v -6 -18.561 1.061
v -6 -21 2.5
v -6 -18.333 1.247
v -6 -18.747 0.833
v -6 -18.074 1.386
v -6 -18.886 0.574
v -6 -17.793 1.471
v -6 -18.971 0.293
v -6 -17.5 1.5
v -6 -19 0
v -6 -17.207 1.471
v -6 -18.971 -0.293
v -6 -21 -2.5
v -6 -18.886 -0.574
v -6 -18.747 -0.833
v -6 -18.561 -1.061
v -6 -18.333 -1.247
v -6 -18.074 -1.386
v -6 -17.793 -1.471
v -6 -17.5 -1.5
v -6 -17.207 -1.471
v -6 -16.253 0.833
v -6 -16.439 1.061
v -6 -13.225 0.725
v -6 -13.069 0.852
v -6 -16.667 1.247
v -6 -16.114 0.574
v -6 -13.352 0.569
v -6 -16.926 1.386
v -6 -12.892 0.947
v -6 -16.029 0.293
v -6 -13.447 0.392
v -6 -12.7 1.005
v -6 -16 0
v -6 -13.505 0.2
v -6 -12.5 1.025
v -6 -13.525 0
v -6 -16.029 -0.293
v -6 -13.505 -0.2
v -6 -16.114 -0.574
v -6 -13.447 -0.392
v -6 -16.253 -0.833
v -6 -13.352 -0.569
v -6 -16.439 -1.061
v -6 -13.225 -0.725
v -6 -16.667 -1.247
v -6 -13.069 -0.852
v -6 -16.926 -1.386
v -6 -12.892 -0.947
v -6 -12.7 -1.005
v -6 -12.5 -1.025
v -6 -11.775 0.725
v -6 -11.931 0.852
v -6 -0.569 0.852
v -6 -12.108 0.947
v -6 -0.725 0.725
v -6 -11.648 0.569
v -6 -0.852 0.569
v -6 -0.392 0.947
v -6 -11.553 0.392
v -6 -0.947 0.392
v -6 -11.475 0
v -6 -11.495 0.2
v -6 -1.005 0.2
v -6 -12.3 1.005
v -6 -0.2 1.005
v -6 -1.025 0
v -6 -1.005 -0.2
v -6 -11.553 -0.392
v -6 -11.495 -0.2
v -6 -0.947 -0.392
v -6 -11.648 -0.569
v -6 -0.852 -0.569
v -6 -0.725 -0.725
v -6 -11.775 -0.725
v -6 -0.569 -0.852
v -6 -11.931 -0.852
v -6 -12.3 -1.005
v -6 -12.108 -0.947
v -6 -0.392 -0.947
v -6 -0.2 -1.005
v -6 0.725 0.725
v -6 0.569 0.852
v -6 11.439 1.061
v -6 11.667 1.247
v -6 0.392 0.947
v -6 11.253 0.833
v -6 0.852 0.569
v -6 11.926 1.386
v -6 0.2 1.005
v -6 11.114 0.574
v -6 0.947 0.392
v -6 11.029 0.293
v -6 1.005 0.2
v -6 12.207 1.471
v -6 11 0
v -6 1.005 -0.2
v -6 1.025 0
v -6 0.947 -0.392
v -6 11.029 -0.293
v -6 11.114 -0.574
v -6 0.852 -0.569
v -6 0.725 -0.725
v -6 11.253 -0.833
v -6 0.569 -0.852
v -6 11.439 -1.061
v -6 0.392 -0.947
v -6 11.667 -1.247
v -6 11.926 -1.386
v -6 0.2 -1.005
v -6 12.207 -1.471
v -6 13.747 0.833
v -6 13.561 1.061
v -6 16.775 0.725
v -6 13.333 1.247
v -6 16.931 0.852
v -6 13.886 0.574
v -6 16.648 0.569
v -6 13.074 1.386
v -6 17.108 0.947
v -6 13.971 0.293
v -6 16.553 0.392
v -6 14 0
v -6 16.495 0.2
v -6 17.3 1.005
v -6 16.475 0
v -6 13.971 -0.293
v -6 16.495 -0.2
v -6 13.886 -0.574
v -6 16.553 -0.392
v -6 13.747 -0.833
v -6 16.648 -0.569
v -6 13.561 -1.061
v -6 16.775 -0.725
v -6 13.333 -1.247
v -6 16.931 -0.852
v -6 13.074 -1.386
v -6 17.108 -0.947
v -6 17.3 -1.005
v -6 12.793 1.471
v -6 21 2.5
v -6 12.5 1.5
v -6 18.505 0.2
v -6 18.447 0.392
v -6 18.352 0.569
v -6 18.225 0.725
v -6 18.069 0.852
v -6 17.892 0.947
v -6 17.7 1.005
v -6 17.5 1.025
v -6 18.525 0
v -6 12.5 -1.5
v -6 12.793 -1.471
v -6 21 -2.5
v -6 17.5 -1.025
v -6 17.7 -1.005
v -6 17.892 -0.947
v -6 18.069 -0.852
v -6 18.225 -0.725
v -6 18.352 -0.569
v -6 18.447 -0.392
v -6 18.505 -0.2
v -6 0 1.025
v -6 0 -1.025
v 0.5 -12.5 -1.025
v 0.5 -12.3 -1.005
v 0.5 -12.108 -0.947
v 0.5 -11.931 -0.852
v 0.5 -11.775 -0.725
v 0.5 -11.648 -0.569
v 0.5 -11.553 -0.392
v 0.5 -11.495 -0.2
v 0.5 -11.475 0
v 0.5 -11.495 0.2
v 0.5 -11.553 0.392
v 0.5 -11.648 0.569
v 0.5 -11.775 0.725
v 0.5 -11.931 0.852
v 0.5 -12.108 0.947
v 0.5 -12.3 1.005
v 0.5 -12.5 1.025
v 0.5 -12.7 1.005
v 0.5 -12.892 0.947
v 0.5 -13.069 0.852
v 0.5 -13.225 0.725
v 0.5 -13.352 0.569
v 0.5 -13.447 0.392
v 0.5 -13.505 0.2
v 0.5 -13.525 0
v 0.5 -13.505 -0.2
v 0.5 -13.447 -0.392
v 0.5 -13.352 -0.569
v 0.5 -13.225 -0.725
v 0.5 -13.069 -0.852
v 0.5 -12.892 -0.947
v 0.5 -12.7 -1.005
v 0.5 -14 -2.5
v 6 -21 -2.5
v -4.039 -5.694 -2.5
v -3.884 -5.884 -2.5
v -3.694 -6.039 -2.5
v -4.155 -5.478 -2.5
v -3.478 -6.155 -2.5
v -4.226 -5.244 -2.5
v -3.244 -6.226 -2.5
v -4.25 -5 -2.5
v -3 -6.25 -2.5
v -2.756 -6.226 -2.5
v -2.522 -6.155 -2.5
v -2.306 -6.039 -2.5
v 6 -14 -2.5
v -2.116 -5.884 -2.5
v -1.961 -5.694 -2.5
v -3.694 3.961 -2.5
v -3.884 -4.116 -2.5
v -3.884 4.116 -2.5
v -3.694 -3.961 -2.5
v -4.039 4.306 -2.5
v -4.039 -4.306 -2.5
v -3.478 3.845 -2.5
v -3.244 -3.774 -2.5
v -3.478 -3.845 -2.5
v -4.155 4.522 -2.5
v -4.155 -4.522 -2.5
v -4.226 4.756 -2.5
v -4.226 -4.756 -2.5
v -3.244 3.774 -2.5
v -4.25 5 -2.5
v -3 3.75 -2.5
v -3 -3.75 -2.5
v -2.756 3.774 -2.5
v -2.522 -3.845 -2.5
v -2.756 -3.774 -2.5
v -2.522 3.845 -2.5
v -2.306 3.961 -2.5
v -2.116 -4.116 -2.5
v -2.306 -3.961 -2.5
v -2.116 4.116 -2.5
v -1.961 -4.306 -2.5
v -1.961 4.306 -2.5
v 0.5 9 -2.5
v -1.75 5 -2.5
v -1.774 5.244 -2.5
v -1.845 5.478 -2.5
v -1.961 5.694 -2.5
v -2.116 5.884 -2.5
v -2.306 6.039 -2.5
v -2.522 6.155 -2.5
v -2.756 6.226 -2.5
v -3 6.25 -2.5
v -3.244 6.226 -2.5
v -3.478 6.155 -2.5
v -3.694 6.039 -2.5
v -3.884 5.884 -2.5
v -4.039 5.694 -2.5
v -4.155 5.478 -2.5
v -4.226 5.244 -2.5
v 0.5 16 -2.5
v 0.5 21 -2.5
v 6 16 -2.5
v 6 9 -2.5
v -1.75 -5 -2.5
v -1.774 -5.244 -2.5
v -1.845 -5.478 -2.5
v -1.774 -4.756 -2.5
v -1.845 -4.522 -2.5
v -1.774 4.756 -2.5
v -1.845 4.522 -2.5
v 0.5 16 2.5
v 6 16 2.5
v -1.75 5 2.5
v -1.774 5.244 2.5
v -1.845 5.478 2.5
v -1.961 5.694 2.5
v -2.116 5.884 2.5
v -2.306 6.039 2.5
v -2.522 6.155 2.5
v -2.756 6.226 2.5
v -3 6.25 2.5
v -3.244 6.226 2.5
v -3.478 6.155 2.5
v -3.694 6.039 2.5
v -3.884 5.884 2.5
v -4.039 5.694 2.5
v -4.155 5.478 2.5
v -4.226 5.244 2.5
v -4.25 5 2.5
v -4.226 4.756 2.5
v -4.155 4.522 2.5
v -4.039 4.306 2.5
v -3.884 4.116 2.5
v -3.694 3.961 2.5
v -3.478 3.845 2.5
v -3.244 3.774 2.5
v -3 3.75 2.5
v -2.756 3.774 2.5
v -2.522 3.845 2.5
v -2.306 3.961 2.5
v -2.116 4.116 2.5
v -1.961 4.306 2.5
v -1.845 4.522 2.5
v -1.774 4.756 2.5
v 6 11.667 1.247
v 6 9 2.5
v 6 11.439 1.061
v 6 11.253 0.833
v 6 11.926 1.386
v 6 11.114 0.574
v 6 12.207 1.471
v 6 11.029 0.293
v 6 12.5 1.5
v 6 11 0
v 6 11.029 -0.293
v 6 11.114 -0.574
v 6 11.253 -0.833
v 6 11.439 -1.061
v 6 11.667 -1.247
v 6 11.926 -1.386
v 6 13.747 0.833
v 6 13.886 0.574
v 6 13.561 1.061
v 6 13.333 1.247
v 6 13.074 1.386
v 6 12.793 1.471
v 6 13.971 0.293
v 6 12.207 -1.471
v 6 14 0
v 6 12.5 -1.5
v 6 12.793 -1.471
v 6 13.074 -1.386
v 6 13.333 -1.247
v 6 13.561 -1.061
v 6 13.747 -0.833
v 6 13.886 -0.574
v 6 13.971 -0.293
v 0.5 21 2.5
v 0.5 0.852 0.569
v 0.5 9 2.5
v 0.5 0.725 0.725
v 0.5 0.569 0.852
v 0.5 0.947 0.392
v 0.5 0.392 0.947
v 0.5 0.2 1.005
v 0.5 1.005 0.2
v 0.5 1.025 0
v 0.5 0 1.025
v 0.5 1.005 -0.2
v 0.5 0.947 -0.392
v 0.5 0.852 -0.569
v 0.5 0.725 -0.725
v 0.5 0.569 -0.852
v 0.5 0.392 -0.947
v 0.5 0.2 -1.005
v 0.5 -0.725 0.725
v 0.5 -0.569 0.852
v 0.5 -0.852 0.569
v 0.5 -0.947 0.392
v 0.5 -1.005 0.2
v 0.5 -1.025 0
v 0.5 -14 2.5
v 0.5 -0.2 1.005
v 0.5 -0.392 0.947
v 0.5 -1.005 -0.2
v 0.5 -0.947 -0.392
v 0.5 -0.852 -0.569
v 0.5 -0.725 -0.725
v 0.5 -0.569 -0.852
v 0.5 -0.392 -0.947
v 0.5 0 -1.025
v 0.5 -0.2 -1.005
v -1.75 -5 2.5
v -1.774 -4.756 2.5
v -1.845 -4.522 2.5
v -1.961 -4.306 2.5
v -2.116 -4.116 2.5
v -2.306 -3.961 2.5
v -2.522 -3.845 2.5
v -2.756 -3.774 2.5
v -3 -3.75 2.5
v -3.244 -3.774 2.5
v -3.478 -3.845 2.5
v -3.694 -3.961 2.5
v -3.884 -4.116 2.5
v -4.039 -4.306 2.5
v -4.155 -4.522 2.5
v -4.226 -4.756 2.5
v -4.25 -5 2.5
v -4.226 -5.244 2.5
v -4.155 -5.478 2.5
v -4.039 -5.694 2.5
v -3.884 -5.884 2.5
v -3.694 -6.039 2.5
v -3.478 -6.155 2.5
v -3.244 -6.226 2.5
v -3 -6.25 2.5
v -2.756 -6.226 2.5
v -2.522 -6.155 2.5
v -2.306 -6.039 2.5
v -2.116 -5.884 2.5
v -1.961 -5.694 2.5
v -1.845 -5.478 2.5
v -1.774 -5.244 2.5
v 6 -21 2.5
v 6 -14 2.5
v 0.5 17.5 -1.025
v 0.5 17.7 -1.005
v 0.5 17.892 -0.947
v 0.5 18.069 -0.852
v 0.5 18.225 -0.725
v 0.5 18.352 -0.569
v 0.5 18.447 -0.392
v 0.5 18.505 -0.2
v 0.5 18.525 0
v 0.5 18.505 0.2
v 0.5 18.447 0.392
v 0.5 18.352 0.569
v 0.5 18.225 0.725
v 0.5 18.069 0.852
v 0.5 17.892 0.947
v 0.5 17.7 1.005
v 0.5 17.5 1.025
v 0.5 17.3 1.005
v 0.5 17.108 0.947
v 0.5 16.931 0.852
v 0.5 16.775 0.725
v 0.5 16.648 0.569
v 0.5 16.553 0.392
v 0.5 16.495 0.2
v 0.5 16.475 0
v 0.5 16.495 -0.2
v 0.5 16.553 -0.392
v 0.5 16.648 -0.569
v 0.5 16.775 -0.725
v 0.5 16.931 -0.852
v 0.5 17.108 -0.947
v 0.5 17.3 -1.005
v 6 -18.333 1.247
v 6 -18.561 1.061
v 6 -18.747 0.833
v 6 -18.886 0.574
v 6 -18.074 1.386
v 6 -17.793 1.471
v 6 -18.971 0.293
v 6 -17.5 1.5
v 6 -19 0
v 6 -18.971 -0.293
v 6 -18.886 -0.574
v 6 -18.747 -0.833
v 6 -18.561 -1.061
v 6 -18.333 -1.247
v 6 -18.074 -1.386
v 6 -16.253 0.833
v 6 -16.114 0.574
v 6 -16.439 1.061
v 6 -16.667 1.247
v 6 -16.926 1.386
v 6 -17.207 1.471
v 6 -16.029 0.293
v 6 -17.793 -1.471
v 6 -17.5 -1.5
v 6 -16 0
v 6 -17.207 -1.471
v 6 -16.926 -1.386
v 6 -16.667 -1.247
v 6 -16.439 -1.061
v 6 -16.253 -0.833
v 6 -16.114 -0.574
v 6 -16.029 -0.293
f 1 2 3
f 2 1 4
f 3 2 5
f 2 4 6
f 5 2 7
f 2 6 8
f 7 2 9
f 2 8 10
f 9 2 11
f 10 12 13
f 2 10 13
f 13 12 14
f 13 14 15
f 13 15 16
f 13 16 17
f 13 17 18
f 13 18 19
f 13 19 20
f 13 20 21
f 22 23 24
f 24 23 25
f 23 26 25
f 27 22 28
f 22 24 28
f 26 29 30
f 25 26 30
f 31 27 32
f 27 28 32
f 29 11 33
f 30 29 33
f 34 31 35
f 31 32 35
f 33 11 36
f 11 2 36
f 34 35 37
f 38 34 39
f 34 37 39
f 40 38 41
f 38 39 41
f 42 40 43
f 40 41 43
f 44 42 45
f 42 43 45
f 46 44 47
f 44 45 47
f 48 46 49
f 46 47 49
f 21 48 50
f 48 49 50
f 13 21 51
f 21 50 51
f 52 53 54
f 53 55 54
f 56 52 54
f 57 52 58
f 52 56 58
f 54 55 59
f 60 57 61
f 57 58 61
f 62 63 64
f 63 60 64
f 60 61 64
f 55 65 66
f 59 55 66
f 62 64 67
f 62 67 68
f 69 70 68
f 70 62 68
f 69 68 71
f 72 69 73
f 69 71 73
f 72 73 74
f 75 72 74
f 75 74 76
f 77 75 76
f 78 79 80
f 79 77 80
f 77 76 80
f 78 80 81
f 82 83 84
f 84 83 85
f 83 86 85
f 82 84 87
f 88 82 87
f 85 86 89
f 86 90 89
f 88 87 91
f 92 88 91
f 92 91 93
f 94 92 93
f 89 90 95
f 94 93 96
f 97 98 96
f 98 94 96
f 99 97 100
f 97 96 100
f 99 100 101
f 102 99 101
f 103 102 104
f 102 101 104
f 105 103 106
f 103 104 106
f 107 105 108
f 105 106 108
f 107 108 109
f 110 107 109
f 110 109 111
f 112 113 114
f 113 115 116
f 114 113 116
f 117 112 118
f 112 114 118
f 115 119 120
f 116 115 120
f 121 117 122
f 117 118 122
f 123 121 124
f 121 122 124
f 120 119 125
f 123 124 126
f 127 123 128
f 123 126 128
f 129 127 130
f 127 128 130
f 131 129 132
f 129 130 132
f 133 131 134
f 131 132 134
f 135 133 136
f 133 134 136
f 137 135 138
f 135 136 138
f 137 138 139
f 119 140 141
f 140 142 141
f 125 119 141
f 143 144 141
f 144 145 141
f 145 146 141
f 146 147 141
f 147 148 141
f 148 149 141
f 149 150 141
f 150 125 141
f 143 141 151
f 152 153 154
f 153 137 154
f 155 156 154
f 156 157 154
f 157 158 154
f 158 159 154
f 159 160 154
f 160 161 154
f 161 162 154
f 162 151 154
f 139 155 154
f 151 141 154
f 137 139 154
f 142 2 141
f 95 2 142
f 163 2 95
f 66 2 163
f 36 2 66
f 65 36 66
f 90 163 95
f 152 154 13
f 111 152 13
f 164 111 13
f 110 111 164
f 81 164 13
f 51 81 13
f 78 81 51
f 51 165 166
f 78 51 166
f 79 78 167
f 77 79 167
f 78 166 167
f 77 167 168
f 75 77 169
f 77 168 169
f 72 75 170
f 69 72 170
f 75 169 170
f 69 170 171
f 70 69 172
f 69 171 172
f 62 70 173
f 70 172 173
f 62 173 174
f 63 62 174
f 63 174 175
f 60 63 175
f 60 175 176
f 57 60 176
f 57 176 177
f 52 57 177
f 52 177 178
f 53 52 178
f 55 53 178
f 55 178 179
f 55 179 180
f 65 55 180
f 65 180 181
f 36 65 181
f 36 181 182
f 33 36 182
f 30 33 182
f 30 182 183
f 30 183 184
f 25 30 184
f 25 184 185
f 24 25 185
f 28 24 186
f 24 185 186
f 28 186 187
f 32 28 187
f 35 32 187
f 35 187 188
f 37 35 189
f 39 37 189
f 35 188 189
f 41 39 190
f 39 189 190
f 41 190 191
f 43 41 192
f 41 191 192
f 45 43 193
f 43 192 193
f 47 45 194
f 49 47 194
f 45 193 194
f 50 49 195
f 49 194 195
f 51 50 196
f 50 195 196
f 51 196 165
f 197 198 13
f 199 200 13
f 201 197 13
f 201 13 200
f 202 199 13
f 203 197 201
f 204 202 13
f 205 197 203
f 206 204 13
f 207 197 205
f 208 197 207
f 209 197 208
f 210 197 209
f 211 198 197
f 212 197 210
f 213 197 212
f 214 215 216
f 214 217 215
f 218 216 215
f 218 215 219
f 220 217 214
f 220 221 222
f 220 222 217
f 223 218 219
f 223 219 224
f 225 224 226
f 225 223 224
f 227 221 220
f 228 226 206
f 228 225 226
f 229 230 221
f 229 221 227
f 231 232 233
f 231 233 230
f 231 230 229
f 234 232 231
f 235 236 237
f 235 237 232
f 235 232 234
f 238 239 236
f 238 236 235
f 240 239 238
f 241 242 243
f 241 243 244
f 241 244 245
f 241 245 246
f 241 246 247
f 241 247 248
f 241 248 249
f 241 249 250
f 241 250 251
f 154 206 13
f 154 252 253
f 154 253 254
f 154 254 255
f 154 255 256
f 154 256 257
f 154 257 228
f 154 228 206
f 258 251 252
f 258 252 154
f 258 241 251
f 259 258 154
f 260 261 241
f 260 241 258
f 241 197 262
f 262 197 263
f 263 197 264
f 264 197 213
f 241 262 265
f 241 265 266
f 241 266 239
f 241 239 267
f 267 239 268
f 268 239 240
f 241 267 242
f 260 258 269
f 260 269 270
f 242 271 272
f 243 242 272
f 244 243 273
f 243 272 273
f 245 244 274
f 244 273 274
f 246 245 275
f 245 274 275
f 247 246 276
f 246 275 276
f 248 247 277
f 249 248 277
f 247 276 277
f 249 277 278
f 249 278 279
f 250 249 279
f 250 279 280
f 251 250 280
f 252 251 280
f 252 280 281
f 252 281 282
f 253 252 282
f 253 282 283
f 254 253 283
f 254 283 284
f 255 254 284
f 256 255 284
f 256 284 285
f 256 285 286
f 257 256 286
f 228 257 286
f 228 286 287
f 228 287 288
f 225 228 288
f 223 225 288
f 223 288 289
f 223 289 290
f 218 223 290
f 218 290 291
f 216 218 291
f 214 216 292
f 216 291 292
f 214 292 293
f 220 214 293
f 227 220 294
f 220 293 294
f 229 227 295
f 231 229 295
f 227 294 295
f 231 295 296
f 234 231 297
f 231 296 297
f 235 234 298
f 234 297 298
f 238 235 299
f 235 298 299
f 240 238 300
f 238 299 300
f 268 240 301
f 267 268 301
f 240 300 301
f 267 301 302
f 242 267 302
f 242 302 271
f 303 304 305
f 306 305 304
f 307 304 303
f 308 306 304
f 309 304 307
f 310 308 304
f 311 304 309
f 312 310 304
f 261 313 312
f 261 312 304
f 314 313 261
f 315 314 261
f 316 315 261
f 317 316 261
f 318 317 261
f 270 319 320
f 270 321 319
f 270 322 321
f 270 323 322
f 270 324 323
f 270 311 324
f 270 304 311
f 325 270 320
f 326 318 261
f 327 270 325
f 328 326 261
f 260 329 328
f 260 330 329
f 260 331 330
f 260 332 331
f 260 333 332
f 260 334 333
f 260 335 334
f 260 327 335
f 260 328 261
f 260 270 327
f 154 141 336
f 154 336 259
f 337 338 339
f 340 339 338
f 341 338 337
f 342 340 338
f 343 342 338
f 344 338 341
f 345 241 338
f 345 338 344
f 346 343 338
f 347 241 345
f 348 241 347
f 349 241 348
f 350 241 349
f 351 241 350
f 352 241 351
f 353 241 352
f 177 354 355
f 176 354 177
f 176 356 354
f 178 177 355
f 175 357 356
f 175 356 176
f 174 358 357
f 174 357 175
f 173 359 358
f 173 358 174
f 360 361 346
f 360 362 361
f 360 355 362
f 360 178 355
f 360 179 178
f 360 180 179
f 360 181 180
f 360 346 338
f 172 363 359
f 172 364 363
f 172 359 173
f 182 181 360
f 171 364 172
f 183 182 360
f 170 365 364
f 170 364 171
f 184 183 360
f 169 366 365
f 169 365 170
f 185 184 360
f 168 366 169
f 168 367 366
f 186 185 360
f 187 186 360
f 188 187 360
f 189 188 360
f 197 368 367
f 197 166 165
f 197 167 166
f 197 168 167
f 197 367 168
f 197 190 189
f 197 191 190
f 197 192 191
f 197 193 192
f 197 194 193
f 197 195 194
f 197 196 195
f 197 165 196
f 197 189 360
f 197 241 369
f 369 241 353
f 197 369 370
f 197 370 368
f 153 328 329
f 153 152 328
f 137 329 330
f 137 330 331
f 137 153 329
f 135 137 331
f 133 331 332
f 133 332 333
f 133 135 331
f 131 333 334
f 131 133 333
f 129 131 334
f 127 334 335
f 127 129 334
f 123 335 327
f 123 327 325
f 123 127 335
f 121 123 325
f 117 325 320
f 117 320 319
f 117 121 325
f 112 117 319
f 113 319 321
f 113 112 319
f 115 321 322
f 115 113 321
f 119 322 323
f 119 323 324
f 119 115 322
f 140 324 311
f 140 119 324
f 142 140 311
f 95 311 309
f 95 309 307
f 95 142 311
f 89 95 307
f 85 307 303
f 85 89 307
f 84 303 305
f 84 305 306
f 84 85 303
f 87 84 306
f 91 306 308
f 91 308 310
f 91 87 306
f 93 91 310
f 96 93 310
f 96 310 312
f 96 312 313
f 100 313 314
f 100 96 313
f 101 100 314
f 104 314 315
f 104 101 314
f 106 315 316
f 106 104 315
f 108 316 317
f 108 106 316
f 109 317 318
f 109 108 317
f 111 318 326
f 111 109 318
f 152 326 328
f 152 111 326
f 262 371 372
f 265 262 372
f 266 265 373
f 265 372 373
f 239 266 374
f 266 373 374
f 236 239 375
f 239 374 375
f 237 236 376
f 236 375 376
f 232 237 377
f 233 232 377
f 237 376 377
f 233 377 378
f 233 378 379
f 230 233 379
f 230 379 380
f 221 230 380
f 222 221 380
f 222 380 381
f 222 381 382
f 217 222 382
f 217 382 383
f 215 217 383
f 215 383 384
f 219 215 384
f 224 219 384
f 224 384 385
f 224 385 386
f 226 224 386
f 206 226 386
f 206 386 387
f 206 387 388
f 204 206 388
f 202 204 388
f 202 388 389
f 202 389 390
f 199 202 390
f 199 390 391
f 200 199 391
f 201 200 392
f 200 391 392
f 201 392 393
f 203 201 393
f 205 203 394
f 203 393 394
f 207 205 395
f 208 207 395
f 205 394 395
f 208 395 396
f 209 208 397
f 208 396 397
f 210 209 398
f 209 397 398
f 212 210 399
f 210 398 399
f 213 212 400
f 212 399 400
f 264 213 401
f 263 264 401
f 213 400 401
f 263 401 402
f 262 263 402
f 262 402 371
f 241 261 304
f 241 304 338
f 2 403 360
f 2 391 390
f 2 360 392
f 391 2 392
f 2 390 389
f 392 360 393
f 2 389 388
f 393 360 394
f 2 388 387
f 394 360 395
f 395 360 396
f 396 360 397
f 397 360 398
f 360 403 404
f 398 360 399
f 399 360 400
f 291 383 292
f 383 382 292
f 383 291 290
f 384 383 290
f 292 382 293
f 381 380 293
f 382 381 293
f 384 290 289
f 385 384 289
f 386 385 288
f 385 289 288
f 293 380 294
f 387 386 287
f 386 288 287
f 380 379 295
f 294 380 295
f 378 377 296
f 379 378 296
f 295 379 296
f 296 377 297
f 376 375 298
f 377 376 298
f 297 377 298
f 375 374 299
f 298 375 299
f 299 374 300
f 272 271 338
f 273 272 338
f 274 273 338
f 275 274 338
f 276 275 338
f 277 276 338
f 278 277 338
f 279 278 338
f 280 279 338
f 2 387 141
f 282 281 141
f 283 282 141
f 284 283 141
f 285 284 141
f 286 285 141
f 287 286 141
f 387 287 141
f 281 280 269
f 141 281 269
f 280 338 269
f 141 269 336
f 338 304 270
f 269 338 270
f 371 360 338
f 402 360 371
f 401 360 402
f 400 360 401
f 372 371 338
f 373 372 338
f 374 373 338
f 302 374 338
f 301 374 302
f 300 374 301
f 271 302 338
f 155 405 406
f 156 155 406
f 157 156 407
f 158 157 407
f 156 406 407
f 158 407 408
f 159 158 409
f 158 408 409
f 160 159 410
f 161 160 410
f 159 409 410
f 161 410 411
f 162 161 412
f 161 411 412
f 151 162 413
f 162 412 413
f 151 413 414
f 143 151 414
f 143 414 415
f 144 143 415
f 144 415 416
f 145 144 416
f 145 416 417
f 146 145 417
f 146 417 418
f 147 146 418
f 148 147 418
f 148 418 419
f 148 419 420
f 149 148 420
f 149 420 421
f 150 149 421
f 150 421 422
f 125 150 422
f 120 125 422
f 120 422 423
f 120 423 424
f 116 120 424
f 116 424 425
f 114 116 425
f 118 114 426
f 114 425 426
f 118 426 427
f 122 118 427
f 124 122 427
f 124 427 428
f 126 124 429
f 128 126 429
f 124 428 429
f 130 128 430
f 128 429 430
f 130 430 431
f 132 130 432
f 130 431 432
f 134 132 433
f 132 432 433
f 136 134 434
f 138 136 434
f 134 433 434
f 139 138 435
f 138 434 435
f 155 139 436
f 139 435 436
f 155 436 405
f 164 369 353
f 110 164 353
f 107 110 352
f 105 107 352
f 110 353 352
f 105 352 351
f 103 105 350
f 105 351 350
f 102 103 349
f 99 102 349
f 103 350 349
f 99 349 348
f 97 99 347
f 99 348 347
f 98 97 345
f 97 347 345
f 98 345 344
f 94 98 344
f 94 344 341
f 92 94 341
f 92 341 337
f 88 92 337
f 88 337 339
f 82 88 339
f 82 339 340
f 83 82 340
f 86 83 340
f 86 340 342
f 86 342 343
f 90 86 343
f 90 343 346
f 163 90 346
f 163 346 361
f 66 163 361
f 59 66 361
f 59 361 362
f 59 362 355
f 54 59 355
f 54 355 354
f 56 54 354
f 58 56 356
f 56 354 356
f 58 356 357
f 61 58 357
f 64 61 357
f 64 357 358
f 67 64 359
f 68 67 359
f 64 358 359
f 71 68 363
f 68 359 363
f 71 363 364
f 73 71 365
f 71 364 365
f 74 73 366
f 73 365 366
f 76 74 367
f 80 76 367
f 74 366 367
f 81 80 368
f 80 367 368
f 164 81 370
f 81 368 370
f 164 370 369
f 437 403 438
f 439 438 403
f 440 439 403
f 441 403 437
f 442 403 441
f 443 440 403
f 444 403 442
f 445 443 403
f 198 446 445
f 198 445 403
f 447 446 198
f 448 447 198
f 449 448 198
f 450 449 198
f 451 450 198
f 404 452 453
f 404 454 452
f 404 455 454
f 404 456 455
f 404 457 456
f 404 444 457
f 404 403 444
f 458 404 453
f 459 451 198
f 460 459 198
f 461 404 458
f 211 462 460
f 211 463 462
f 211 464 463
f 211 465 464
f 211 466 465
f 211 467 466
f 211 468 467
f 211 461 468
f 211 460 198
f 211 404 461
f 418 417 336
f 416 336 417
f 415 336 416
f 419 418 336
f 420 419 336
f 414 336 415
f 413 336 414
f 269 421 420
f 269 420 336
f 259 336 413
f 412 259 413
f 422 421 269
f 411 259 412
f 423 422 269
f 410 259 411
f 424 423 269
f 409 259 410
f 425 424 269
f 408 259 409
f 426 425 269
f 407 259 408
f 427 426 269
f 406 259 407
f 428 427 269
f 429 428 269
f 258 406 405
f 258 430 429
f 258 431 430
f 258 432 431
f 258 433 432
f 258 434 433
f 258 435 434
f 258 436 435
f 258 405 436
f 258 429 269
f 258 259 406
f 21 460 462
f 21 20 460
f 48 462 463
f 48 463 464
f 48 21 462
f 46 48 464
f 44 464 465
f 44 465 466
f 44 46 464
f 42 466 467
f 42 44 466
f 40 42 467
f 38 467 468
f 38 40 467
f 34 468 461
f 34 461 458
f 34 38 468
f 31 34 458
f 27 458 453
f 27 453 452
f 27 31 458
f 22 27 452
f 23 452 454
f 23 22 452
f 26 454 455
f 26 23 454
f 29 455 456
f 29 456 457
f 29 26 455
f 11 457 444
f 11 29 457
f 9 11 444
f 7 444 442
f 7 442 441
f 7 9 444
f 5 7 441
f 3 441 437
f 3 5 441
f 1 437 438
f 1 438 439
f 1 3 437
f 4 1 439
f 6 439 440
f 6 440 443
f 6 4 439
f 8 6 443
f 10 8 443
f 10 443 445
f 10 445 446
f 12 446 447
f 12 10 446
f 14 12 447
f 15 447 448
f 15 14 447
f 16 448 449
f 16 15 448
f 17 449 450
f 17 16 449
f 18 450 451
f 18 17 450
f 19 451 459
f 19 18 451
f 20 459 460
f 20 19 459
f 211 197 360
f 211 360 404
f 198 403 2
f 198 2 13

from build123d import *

# Parameters (mm, degrees)
ESQUISSE1_W              = 5
ESQUISSE1_H              = 42
ESQUISSE1_R              = 1.5
EXTRUSION1_DEPTH         = 6
TROU_TARAUD_M3X0_51_D    = 2.5
ESQUISSE4_OUTSIDE_W      = 22.794
ESQUISSE4_OUTSIDE_H      = 52.794
ENL_V_MAT_EXTRU_1_DEPTH  = 23.405356502
TROU_TARAUD_M2_5X0_451_D = 2.05


with BuildPart() as part:
    # Esquisse1 → Extrusion1 (new, symmetric)
    with BuildSketch(Plane(origin=(0, 0, 0), x_dir=(0, 0, -1), z_dir=(1, 0, 0))):
        Rectangle(ESQUISSE1_W, ESQUISSE1_H)
        with Locations((0, -17.5)):
            Circle(ESQUISSE1_R, mode=Mode.SUBTRACT)
        with Locations((0, 12.5)):
            Circle(ESQUISSE1_R, mode=Mode.SUBTRACT)
    extrude(amount=EXTRUSION1_DEPTH, both=True)

    # Trou taraudé M3x0.51 (through all)
    with Locations(Plane(origin=(0, 0, -2.5), x_dir=(-1, 0, 0), z_dir=(0, 0, -1))):
        with Locations((3, 5), (3, -5)):
            Hole(TROU_TARAUD_M3X0_51_D / 2)

    # Esquisse4 outside → Enlèv. mat.-Extru.1 (cut, through all)
    with BuildSketch(Plane(origin=(0, 0, -2.5), x_dir=(-1, 0, 0), z_dir=(0, 0, -1))):
        Rectangle(ESQUISSE4_OUTSIDE_W, ESQUISSE4_OUTSIDE_H)
        Polygon((6, 21), (-0.5, 21), (-0.5, 16), (-6, 16), (-6, 9), (-0.5, 9), (-0.5, -14), (-6, -14), (-6, -21), (6, -21), align=None, mode=Mode.SUBTRACT)
    extrude(amount=-ENL_V_MAT_EXTRU_1_DEPTH, mode=Mode.SUBTRACT)

    # Trou taraudé M2.5x0.451 (through all)
    with Locations(Plane.ZY.offset(6)):
        with Locations((0, 17.5), (0, 0), (0, -12.5)):
            Hole(TROU_TARAUD_M2_5X0_451_D / 2)


solid = part.part
